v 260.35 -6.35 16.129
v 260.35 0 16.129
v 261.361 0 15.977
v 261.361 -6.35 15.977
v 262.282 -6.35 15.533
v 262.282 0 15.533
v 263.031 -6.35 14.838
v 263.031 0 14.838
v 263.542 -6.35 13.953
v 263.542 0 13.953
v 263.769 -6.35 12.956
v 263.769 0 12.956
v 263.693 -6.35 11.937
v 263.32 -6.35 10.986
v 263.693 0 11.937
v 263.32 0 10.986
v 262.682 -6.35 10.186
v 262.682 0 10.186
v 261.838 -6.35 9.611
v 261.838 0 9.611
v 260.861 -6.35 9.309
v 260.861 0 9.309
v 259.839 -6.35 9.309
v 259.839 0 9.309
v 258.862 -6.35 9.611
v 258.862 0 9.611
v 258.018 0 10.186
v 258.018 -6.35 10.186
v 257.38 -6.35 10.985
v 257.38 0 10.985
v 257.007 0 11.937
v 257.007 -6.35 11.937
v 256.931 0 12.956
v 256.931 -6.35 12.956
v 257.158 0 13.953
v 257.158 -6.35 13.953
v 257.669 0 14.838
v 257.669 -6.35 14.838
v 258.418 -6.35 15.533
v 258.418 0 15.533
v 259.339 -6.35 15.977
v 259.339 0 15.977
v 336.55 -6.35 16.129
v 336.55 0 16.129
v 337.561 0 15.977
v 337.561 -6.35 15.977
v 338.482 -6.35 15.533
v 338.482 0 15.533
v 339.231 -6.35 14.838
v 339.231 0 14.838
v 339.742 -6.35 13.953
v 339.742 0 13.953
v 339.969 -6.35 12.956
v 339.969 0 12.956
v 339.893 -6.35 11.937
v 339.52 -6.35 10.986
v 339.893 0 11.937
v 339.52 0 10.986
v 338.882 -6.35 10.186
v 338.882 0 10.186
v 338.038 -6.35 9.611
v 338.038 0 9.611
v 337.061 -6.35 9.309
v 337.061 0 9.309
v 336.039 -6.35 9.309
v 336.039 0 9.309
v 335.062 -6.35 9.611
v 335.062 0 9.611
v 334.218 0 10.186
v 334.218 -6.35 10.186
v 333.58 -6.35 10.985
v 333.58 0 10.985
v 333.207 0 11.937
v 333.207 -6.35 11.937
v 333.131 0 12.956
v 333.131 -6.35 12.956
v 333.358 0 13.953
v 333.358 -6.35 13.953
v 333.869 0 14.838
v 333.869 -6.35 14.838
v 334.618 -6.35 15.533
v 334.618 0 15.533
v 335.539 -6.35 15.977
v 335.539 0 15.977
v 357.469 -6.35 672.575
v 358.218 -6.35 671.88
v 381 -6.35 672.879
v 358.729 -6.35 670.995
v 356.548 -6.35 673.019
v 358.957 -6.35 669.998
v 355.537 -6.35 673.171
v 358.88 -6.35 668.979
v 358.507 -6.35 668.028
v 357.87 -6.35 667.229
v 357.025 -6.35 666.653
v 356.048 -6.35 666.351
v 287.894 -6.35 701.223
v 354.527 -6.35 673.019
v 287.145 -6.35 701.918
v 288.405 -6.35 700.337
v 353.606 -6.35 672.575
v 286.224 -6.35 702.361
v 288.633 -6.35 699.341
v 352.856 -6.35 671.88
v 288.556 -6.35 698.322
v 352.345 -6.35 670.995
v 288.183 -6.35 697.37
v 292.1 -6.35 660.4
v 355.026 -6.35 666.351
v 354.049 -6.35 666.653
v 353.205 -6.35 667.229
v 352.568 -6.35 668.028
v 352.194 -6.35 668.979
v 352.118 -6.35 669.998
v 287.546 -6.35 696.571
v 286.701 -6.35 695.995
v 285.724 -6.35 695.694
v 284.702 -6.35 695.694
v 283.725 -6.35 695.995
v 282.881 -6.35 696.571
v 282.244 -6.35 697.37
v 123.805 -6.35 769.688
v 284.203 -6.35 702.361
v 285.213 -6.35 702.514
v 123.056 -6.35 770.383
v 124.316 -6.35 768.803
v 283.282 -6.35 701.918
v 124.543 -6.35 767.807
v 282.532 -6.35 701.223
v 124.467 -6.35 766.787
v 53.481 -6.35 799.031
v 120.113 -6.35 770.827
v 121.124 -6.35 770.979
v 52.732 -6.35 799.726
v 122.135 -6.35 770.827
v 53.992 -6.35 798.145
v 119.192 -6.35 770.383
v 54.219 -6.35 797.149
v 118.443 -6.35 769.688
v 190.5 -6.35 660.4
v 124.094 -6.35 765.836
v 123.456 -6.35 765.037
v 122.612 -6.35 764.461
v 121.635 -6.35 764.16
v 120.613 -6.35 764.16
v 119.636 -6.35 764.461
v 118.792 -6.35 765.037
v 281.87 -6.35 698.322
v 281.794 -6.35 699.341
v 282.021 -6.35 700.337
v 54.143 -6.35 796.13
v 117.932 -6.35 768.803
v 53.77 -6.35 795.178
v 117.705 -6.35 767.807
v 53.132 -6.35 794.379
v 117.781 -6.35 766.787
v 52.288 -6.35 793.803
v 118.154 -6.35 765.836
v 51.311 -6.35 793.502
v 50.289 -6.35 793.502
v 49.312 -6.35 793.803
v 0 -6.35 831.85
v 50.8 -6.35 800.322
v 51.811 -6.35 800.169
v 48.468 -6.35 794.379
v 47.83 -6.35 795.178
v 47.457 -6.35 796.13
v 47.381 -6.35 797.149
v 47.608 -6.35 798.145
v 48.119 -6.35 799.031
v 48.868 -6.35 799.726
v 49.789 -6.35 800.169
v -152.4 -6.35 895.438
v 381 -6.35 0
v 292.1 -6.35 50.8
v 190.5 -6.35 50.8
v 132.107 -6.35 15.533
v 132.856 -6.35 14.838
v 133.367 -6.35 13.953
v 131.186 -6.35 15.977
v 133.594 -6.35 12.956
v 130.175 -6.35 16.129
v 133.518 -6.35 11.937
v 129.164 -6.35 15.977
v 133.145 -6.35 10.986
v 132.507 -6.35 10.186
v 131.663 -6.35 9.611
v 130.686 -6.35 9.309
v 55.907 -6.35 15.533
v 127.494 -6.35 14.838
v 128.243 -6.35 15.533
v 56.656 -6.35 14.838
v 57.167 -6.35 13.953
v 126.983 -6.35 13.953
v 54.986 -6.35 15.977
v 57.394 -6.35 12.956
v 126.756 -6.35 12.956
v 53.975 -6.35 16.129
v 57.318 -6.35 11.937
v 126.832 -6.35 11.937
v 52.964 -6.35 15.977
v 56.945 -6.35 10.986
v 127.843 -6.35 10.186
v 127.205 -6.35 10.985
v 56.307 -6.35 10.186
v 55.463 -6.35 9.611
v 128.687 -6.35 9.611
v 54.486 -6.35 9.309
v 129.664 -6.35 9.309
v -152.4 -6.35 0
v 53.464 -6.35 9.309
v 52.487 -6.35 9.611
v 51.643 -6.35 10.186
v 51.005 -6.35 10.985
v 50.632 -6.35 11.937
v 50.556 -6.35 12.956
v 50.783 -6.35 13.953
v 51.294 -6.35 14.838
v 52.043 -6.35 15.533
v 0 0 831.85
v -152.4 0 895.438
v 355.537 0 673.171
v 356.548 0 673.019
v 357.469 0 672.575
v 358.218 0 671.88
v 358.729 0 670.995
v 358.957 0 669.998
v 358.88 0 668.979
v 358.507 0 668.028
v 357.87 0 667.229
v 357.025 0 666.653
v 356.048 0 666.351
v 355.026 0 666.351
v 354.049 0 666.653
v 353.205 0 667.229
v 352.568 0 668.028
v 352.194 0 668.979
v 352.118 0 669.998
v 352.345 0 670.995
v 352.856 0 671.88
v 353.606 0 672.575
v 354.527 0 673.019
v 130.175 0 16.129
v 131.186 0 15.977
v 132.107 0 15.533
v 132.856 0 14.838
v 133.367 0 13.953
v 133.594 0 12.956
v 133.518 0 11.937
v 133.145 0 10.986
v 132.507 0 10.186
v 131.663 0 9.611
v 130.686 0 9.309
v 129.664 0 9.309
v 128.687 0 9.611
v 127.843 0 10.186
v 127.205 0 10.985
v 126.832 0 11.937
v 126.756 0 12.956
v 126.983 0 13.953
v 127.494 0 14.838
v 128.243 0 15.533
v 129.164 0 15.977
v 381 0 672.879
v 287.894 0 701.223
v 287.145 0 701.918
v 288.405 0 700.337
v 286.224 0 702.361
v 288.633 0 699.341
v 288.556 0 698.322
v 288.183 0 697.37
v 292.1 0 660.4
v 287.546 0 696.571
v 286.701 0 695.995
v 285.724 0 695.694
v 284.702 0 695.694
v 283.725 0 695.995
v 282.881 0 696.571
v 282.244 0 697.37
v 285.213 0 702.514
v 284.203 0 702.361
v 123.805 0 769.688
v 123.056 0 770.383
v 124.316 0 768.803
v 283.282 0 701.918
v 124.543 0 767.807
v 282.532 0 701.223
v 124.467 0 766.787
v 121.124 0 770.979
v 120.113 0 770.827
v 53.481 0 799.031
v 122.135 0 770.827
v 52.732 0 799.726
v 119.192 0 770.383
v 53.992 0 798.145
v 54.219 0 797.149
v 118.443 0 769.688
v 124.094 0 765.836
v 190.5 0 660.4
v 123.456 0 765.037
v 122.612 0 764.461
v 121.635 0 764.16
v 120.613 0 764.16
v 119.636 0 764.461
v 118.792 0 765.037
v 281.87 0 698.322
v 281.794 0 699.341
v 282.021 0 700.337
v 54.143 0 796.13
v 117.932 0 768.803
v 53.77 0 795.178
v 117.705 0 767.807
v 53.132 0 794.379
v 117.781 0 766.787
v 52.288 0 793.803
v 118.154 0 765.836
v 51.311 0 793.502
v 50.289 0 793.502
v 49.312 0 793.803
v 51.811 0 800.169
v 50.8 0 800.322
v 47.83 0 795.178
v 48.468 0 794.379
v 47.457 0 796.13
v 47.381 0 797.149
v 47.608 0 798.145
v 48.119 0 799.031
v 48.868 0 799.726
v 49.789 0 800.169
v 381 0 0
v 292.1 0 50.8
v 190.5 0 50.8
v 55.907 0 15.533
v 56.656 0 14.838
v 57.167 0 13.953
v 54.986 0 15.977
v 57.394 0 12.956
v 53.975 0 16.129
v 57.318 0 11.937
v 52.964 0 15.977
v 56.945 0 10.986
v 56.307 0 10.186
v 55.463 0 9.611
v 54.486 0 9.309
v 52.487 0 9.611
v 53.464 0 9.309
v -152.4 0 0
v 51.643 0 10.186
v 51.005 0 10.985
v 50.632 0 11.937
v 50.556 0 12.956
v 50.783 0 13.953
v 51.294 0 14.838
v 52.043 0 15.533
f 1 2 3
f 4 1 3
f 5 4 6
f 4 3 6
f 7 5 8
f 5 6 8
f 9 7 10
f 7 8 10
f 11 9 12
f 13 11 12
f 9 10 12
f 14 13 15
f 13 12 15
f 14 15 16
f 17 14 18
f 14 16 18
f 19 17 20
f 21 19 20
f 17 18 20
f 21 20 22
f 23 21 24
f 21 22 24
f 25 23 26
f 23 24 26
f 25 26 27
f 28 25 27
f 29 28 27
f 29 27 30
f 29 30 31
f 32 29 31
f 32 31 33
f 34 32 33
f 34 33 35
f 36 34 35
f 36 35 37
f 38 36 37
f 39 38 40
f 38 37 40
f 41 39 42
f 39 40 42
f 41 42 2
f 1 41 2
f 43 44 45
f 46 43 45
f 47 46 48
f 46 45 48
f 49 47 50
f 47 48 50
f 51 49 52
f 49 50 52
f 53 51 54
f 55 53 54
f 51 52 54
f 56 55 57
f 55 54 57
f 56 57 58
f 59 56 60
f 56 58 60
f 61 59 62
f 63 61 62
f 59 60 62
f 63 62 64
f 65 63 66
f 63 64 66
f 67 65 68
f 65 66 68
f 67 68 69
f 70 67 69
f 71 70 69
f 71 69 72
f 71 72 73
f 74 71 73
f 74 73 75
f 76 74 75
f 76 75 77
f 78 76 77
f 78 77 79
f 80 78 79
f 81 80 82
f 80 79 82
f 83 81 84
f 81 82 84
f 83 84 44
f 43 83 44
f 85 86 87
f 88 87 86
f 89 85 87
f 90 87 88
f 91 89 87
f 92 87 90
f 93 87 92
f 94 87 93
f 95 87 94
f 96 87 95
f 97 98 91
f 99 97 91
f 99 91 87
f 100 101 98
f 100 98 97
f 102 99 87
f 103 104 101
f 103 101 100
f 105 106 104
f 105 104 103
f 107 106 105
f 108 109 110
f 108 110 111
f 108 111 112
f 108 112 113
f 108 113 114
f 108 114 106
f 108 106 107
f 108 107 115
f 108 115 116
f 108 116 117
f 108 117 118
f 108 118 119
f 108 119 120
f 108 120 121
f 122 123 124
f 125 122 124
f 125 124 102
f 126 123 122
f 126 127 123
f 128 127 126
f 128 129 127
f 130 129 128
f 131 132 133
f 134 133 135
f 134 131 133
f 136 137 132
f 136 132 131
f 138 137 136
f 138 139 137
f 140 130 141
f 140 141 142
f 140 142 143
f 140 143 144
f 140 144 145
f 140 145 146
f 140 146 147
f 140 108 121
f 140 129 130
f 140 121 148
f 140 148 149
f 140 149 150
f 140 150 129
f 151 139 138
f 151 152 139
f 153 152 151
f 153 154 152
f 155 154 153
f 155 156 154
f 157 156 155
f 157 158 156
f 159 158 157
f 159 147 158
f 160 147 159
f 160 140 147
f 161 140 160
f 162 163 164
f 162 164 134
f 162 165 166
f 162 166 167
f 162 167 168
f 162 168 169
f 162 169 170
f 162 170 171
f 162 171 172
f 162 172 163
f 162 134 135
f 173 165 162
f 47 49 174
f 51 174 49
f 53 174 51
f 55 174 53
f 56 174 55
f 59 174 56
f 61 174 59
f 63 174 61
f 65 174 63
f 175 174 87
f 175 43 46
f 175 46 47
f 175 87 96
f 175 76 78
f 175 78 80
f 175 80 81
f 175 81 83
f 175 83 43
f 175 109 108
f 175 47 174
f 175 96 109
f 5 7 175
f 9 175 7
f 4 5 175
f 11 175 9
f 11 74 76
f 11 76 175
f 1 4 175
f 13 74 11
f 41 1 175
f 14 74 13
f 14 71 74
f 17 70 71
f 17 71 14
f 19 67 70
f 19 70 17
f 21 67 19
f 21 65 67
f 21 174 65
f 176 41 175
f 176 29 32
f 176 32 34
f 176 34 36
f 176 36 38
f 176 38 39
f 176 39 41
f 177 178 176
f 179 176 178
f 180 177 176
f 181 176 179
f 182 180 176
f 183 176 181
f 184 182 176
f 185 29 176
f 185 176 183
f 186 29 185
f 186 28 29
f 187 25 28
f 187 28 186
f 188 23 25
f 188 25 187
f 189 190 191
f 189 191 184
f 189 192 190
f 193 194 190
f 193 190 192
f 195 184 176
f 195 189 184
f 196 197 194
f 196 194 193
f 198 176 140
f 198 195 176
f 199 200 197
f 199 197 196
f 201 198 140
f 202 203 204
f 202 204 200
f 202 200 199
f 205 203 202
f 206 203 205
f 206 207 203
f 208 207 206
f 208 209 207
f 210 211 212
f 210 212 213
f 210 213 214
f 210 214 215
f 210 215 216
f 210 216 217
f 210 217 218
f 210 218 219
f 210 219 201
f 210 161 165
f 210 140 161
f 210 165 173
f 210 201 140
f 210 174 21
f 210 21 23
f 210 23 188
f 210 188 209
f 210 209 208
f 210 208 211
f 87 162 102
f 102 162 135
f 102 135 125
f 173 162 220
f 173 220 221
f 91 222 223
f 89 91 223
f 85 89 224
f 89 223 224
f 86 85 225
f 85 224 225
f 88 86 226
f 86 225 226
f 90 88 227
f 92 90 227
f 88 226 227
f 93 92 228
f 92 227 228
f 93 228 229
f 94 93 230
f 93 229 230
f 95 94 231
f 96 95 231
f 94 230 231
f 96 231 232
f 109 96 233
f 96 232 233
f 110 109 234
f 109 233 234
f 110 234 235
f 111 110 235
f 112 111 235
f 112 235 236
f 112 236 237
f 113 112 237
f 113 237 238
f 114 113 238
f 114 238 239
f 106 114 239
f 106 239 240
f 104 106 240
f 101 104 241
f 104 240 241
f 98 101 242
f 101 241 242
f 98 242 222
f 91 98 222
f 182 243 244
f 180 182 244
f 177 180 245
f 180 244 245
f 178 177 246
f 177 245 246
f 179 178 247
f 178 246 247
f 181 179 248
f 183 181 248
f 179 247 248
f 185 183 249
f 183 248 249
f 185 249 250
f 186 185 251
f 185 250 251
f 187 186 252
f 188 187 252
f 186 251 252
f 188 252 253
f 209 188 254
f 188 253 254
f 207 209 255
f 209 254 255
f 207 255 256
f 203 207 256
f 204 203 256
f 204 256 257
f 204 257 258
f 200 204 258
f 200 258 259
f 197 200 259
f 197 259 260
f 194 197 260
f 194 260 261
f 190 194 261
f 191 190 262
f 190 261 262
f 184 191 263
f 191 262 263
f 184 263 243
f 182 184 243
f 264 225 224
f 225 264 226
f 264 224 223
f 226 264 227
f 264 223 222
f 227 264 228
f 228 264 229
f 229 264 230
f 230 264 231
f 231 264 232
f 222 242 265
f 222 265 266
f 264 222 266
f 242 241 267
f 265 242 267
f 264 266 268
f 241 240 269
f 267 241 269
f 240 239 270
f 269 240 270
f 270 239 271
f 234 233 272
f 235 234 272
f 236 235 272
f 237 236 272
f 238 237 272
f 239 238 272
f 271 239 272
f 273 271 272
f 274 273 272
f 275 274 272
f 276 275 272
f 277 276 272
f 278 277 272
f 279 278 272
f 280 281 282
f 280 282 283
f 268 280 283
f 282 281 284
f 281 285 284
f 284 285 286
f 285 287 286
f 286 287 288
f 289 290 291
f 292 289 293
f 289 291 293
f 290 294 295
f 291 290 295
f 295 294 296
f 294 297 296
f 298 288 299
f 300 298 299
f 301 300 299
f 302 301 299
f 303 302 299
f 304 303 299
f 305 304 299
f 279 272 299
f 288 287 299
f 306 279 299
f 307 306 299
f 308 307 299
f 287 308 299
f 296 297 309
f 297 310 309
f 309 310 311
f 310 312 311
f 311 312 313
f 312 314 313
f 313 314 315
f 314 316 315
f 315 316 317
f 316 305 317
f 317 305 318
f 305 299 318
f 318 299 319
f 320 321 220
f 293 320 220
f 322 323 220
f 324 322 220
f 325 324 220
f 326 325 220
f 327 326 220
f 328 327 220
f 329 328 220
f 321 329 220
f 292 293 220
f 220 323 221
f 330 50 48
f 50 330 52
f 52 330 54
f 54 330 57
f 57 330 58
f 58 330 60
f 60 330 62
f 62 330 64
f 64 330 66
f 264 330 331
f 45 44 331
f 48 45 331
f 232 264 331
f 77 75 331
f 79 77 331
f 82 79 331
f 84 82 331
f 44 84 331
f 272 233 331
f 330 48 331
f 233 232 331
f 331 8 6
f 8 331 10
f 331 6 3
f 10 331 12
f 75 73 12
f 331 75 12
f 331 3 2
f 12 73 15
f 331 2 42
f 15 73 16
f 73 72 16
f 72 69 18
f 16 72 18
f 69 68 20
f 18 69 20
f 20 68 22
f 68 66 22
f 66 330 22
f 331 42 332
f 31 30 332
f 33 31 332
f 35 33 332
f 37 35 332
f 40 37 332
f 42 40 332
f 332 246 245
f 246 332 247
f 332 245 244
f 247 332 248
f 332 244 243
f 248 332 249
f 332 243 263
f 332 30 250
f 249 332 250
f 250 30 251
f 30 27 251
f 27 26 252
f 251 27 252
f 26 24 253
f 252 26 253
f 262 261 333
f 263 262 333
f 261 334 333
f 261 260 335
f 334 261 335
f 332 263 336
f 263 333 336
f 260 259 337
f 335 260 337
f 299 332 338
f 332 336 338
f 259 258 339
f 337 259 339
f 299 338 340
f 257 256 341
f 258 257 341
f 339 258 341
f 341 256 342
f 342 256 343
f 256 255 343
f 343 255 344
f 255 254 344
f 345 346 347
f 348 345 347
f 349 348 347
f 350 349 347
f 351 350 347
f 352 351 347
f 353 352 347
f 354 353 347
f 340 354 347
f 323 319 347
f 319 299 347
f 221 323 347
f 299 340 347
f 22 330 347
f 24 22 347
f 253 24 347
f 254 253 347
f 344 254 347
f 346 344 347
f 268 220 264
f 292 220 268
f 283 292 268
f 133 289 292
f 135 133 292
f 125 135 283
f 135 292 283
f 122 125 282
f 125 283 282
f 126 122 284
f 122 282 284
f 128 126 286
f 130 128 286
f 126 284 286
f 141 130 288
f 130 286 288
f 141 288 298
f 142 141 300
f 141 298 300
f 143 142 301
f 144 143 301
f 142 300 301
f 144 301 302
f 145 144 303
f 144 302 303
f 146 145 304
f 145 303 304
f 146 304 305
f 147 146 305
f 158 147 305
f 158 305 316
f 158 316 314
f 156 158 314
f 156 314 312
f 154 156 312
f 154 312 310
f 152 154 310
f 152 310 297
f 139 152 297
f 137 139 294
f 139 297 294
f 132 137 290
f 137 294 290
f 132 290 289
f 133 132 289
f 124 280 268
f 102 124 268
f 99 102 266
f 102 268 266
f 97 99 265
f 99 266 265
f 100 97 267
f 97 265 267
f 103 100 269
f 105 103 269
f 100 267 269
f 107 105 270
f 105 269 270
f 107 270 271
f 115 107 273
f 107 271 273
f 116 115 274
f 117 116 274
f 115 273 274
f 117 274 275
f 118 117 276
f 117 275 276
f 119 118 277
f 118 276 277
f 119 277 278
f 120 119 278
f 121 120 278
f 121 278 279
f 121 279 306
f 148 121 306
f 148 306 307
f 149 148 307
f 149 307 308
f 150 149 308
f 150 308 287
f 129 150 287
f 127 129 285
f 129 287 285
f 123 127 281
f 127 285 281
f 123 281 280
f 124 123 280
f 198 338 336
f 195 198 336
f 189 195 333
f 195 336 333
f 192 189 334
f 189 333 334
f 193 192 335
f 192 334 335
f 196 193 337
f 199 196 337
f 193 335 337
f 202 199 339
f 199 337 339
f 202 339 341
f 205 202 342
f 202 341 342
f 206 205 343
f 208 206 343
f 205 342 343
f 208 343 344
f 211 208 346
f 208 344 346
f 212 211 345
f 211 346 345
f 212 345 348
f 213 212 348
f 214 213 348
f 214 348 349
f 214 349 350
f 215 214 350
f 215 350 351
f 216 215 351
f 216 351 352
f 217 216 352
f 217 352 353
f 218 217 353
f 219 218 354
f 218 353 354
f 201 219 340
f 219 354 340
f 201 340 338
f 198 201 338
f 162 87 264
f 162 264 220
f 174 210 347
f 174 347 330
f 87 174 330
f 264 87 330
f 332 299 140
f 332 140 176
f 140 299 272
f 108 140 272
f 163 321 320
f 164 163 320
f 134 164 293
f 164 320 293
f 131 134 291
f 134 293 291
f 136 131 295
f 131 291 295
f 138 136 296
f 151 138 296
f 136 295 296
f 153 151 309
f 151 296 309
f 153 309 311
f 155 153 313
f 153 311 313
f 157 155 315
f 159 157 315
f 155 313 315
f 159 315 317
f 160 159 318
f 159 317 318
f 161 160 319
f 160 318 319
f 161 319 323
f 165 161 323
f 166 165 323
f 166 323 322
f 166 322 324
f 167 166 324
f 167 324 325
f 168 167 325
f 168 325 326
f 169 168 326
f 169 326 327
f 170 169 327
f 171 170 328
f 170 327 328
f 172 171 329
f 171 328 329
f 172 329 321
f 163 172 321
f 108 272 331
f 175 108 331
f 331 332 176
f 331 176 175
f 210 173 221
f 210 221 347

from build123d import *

# Parameters (mm, degrees)
SKETCH1_W               = 381
SKETCH1_H               = 6.35
BASE_FLANGE1_DEPTH      = 831.85
CUT_EXTRUDE1_DEPTH      = 915.973084304
CUT_EXTRUDE1_DEPTH_BACK = 6.35
SKETCH9_R               = 3.429
CUT_EXTRUDE2_DEPTH      = 6.35
SKETCH10_R              = 3.429
CUT_EXTRUDE3_DEPTH      = 6.35
SKETCH11_W              = 101.6
SKETCH11_H              = 609.6
CUT_EXTRUDE4_DEPTH      = 6.35
BOSS_EXTRUDE1_START     = -6.35
BOSS_EXTRUDE1_DEPTH     = 6.35


# Sheet-metal steps are written as plain solids
with BuildPart() as part:
    # Sketch1 → Base-Flange1 (new body)
    with BuildSketch(Plane.XY):
        with Locations((190.5, -3.175)):
            Rectangle(SKETCH1_W, SKETCH1_H)
    extrude(amount=BASE_FLANGE1_DEPTH)

    # Sketch8 → Cut-Extrude1 (cut, two sides: drawn at the far end of the back side and taken through both)
    with BuildSketch(Plane(origin=(0, 0, 0), x_dir=(1, 0, 0), z_dir=(0, 1, 0)).offset(-CUT_EXTRUDE1_DEPTH_BACK)):
        Polygon((381, -672.879100114), (0, -831.85), (381, -831.85), align=None)
    extrude(amount=CUT_EXTRUDE1_DEPTH + CUT_EXTRUDE1_DEPTH_BACK, mode=Mode.SUBTRACT)

    # Sketch9 → Cut-Extrude2 (cut)
    with BuildSketch(Plane(origin=(0, 0, 0), x_dir=(1, 0, 0), z_dir=(0, 1, 0))):
        with Locations(Location((130.175, -12.7, 0), (0, 0, 270))):
            Circle(SKETCH9_R)
        with Locations(Location((53.975, -12.7, 0), (0, 0, 270))):
            Circle(SKETCH9_R)
    extrude(amount=-CUT_EXTRUDE2_DEPTH, mode=Mode.SUBTRACT)

    # Sketch10 → Cut-Extrude3 (cut)
    with BuildSketch(Plane(origin=(0, 0, 0), x_dir=(1, 0, 0), z_dir=(0, 1, 0))):
        with Locations(Location((50.8, -796.892712954, 0), (0, 0, 270))):
            Circle(SKETCH10_R)
        with Locations(Location((121.123977295, -767.550282628, 0), (0, 0, 270))):
            Circle(SKETCH10_R)
        with Locations(Location((285.21325765, -699.084611868, 0), (0, 0, 270))):
            Circle(SKETCH10_R)
        with Locations(Location((355.537234945, -669.742181542, 0), (0, 0, 270))):
            Circle(SKETCH10_R)
        with Locations(Location((260.35, -12.7, 0), (0, 0, 270))):
            Circle(SKETCH10_R)
        with Locations(Location((336.55, -12.7, 0), (0, 0, 270))):
            Circle(SKETCH10_R)
    extrude(amount=-CUT_EXTRUDE3_DEPTH, mode=Mode.SUBTRACT)

    # Sketch11 → Cut-Extrude4 (cut)
    with BuildSketch(Plane(origin=(0, 0, 0), x_dir=(1, 0, 0), z_dir=(0, 1, 0))):
        with Locations((241.3, -355.6)):
            Rectangle(SKETCH11_W, SKETCH11_H)
    extrude(amount=-CUT_EXTRUDE4_DEPTH, mode=Mode.SUBTRACT)

    # Sketch12 → Boss-Extrude1 (add)
    with BuildSketch(Plane(origin=(0, 0, 0), x_dir=(1, 0, 0), z_dir=(0, 1, 0)).offset(BOSS_EXTRUDE1_START)):
        Polygon((0, -831.85), (-152.4, -895.438359954), (-152.4, 0), (0, 0), align=None)
    extrude(amount=BOSS_EXTRUDE1_DEPTH)


solid = part.part
